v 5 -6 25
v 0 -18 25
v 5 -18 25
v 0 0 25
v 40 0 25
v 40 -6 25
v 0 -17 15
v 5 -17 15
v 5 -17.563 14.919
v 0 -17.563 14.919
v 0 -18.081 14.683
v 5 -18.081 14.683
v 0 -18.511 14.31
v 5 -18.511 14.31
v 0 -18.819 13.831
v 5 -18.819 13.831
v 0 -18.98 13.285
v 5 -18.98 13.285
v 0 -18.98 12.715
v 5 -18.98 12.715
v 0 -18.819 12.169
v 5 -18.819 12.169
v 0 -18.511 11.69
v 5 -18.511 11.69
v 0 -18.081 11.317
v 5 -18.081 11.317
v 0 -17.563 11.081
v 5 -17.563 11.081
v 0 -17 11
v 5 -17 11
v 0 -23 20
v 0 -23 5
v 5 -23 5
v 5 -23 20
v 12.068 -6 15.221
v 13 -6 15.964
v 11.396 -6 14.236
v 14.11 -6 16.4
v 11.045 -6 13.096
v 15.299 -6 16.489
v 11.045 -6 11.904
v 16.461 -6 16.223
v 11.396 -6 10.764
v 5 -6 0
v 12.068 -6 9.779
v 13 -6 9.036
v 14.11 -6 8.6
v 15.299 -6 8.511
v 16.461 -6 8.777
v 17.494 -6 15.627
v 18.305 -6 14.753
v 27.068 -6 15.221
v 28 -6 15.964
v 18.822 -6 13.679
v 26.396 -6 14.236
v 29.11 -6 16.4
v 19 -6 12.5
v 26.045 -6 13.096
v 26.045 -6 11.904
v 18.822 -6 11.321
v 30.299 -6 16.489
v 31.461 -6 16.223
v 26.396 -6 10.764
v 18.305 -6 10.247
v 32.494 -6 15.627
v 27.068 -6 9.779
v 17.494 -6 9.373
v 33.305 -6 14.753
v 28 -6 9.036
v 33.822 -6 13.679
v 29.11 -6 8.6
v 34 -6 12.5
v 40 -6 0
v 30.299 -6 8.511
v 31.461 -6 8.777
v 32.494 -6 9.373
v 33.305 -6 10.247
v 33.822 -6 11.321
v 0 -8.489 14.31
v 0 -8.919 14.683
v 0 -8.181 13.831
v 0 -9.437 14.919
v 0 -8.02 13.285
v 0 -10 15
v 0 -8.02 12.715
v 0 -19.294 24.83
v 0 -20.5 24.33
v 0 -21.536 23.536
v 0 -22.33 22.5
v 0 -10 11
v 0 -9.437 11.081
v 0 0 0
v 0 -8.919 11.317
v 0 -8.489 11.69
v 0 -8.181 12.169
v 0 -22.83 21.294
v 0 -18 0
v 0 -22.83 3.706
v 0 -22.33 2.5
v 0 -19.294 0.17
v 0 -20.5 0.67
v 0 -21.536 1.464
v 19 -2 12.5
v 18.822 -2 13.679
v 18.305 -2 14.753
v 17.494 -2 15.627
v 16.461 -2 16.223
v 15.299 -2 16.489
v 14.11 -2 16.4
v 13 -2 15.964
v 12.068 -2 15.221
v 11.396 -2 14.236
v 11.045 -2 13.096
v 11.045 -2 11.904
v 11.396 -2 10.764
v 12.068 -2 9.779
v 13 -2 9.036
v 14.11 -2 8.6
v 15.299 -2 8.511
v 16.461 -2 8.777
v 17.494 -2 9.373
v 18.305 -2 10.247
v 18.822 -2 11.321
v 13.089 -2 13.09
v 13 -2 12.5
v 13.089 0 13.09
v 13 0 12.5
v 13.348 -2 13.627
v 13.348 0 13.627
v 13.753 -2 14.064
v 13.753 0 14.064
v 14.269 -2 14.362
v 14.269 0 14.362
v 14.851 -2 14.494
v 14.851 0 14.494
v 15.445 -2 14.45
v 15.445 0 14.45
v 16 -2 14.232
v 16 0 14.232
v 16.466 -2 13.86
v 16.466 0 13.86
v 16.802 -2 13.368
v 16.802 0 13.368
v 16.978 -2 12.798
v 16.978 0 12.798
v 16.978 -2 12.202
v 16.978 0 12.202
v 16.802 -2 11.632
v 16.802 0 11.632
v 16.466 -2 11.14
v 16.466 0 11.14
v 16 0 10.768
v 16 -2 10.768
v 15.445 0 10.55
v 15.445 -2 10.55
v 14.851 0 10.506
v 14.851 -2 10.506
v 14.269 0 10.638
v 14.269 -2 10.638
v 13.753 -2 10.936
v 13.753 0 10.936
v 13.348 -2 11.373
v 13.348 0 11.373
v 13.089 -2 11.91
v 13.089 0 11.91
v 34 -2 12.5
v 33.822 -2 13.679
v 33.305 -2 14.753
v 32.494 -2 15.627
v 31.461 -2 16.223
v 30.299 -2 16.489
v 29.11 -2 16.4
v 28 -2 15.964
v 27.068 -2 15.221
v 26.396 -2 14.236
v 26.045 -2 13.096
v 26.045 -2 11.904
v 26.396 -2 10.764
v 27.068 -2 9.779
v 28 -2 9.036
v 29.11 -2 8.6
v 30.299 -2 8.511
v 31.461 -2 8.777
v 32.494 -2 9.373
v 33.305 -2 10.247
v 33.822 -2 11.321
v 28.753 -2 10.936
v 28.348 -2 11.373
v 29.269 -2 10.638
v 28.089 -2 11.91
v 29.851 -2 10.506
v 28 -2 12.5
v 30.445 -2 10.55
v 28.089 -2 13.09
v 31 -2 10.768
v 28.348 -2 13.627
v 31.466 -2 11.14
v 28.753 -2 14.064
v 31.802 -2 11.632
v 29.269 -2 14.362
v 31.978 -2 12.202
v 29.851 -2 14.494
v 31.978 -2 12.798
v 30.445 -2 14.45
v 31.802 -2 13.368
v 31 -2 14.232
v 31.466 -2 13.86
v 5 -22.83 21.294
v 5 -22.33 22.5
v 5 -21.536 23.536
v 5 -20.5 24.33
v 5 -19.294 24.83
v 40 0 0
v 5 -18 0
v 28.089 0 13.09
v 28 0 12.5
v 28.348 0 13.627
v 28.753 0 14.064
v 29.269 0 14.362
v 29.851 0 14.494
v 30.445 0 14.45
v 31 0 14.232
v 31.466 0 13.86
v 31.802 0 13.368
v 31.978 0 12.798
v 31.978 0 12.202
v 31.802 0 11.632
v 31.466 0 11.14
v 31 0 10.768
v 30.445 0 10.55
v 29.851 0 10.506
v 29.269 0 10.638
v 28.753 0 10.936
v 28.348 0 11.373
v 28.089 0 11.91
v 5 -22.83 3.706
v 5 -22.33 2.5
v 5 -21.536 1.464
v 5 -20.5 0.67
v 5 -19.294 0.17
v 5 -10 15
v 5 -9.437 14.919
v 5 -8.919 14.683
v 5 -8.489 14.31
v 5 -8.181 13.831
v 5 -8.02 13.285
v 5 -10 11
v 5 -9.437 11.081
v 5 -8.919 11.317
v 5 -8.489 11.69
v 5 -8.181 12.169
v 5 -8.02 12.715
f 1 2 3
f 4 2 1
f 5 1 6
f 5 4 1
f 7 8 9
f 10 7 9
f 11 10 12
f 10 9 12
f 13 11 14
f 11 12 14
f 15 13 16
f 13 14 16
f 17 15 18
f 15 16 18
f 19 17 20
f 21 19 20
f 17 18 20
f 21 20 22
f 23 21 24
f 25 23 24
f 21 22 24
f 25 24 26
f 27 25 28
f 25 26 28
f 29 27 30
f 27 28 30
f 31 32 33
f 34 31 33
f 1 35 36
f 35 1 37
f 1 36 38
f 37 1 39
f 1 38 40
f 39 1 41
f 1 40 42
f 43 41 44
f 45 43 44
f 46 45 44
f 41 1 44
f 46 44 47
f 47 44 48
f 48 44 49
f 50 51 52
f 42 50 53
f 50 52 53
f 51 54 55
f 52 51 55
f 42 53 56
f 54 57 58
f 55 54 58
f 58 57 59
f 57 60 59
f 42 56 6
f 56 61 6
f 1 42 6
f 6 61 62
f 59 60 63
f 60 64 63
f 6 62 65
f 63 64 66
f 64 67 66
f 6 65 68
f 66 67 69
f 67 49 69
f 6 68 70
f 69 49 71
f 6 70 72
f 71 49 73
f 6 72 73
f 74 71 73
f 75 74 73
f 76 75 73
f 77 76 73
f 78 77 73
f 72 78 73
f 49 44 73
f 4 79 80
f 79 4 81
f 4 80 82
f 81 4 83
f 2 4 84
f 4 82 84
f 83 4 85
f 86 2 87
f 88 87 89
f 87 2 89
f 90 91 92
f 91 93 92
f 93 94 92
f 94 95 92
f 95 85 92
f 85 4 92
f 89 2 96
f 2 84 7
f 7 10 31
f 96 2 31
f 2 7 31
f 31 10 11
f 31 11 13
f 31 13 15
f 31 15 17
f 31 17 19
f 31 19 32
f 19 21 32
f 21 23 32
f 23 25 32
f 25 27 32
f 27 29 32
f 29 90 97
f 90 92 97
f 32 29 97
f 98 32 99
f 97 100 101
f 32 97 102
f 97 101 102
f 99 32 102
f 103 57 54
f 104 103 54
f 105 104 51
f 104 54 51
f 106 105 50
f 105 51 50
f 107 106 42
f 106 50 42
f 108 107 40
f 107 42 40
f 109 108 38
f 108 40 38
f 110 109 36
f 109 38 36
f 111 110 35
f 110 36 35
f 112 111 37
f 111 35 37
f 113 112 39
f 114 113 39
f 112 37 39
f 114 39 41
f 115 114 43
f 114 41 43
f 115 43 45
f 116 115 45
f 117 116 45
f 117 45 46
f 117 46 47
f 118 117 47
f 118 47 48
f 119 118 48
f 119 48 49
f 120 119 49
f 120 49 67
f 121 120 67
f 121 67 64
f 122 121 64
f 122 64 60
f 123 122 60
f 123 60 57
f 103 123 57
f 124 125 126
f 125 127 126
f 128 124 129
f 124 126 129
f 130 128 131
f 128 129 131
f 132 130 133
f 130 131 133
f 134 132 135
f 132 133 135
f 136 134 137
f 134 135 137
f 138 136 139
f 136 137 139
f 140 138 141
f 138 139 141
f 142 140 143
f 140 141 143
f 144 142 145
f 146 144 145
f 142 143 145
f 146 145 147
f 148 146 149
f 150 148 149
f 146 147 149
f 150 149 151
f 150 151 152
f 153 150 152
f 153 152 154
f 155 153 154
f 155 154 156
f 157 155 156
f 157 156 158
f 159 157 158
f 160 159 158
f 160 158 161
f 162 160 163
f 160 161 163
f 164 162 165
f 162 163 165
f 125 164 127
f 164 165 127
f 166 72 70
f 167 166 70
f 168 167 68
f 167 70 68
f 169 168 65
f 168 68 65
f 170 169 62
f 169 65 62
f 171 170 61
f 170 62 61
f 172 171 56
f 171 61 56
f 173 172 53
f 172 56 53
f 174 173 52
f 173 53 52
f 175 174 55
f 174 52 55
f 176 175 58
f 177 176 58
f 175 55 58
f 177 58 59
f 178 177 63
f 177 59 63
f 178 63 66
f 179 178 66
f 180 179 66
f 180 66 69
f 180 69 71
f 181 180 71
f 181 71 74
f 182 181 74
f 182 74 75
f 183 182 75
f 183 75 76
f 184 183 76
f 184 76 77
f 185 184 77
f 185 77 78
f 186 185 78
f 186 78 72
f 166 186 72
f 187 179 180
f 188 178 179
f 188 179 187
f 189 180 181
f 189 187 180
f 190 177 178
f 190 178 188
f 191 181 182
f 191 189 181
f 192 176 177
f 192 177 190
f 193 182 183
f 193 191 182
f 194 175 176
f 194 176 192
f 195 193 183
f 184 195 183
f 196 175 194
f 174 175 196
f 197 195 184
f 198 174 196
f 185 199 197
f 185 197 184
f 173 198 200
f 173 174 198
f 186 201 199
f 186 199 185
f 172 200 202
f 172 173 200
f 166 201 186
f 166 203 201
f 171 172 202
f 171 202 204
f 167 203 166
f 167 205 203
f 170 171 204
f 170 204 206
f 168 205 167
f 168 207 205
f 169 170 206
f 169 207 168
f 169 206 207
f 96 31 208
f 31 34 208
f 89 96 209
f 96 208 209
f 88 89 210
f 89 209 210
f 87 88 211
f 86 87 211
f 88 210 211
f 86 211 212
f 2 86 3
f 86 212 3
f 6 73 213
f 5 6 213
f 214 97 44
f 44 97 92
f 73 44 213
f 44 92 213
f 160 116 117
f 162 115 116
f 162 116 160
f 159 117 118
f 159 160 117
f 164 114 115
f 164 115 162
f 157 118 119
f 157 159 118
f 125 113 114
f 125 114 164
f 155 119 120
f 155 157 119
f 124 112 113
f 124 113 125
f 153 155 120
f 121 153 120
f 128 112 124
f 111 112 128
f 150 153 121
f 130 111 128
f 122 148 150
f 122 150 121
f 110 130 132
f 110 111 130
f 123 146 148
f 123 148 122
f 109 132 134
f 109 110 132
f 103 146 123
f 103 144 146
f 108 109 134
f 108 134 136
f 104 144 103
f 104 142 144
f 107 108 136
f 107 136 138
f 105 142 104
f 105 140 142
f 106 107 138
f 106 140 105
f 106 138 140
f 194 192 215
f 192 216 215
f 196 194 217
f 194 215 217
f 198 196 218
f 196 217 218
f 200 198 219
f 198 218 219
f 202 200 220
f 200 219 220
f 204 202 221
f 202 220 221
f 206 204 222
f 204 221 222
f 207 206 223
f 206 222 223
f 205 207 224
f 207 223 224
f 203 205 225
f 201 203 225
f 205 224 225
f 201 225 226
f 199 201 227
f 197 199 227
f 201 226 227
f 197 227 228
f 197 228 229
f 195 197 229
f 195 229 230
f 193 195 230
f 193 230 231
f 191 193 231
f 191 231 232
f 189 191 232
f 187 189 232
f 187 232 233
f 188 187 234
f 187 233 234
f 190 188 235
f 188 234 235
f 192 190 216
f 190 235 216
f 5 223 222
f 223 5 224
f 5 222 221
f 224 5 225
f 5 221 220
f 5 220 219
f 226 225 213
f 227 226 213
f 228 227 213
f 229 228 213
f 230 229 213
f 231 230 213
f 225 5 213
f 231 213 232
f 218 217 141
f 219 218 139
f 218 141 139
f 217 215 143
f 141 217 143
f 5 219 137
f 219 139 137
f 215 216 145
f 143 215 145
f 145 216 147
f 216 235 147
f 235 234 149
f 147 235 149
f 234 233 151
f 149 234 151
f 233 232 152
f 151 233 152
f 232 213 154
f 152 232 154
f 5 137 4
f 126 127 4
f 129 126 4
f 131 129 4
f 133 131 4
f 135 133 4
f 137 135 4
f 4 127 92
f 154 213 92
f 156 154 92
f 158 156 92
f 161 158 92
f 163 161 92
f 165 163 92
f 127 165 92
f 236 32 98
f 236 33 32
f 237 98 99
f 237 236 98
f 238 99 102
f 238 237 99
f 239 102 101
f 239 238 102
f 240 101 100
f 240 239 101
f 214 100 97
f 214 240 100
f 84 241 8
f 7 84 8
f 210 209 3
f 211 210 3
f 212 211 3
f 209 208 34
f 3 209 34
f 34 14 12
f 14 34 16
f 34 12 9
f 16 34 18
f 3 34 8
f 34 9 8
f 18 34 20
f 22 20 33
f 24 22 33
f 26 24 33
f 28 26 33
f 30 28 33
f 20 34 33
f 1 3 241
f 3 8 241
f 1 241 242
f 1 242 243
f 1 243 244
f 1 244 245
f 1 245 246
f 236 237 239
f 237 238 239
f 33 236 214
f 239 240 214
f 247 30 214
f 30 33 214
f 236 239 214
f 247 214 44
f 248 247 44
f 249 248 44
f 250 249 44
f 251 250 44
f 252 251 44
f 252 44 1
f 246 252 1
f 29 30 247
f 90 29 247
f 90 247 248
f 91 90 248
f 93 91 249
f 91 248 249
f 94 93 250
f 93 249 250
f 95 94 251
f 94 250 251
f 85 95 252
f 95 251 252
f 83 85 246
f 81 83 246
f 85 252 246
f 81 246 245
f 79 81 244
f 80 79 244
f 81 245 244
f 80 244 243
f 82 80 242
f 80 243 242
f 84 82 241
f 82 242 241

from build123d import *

# Parameters (mm, degrees)
F1_DEPTH       = 25
F2_R           = 5
F4_DEPTH       = 5.001
F6_D           = 4
F6_CBORE_D     = 8
F6_CBORE_DEPTH = 4


# Not quite as in the source:
# - a feature names something its author has since deleted; it is built from what else it names


with BuildPart() as f1:
    # F0 (on Top) → F1 (new body)
    with BuildSketch(Plane.XY):
        Polygon((0, 0), (0, -23), (5, -23), (5, -6), (40, -6), (40, 0), align=None)
    extrude(amount=F1_DEPTH)

    # F2
    f2_edges = [f1.edges().sort_by_distance(p)[0] for p in [
        (2.5, -23, 0),
        (2.5, -23, 25),
    ]]
    fillet(f2_edges, radius=F2_R)

    # F3 (on face) → F4 (cut, through all)
    with BuildSketch(Plane.YZ.offset(5)):
        with BuildLine():
            ThreePointArc((-17, 15), (-19, 13), (-17, 11))
            Line((-17, 11), (-10, 11))
            ThreePointArc((-10, 11), (-8, 13), (-10, 15))
            Line((-10, 15), (-17, 15))
        make_face()
    extrude(amount=-F4_DEPTH, mode=Mode.SUBTRACT)

    # F6 (through all)
    with Locations(Plane.XZ.offset(6)):
        with Locations((30, 12.5), (15, 12.5)):
            CounterBoreHole(F6_D / 2, F6_CBORE_D / 2, F6_CBORE_DEPTH)


solid = f1.part
